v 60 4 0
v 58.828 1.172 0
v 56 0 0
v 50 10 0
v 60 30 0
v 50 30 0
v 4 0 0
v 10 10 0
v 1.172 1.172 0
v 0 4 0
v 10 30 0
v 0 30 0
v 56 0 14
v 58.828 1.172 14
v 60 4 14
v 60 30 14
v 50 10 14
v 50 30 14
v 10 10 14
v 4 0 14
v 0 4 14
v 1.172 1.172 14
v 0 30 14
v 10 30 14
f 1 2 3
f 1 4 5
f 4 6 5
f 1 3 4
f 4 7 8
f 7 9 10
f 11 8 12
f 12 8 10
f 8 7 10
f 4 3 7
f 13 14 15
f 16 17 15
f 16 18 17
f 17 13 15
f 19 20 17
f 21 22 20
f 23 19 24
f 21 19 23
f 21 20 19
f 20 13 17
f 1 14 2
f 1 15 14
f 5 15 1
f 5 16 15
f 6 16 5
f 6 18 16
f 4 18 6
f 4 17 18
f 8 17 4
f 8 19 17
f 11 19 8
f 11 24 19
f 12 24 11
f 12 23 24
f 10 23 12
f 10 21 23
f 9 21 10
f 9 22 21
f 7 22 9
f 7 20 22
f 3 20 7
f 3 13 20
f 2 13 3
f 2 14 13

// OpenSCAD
$fn = 32;

// ----------------------------------------------------------------------
// Heat sink frame: 60 x 30 mm frame, 10 mm walls
// ----------------------------------------------------------------------

// --- parameters (mm) ---
profile_height = 14;      // extrusion height
profile_points = 12;      // points of the closed outline

profile = [[0, 4], [1.172, 1.172], [4, 0], [56, 0], [58.828, 1.172], [60, 4], [60, 30], [50, 30], [50, 10], [10, 10], [10, 30], [0, 30]];  // single closed polygon, 12 points, counter clockwise

// --- the one profile operation ---
linear_extrude(height = profile_height) polygon(points = profile);
